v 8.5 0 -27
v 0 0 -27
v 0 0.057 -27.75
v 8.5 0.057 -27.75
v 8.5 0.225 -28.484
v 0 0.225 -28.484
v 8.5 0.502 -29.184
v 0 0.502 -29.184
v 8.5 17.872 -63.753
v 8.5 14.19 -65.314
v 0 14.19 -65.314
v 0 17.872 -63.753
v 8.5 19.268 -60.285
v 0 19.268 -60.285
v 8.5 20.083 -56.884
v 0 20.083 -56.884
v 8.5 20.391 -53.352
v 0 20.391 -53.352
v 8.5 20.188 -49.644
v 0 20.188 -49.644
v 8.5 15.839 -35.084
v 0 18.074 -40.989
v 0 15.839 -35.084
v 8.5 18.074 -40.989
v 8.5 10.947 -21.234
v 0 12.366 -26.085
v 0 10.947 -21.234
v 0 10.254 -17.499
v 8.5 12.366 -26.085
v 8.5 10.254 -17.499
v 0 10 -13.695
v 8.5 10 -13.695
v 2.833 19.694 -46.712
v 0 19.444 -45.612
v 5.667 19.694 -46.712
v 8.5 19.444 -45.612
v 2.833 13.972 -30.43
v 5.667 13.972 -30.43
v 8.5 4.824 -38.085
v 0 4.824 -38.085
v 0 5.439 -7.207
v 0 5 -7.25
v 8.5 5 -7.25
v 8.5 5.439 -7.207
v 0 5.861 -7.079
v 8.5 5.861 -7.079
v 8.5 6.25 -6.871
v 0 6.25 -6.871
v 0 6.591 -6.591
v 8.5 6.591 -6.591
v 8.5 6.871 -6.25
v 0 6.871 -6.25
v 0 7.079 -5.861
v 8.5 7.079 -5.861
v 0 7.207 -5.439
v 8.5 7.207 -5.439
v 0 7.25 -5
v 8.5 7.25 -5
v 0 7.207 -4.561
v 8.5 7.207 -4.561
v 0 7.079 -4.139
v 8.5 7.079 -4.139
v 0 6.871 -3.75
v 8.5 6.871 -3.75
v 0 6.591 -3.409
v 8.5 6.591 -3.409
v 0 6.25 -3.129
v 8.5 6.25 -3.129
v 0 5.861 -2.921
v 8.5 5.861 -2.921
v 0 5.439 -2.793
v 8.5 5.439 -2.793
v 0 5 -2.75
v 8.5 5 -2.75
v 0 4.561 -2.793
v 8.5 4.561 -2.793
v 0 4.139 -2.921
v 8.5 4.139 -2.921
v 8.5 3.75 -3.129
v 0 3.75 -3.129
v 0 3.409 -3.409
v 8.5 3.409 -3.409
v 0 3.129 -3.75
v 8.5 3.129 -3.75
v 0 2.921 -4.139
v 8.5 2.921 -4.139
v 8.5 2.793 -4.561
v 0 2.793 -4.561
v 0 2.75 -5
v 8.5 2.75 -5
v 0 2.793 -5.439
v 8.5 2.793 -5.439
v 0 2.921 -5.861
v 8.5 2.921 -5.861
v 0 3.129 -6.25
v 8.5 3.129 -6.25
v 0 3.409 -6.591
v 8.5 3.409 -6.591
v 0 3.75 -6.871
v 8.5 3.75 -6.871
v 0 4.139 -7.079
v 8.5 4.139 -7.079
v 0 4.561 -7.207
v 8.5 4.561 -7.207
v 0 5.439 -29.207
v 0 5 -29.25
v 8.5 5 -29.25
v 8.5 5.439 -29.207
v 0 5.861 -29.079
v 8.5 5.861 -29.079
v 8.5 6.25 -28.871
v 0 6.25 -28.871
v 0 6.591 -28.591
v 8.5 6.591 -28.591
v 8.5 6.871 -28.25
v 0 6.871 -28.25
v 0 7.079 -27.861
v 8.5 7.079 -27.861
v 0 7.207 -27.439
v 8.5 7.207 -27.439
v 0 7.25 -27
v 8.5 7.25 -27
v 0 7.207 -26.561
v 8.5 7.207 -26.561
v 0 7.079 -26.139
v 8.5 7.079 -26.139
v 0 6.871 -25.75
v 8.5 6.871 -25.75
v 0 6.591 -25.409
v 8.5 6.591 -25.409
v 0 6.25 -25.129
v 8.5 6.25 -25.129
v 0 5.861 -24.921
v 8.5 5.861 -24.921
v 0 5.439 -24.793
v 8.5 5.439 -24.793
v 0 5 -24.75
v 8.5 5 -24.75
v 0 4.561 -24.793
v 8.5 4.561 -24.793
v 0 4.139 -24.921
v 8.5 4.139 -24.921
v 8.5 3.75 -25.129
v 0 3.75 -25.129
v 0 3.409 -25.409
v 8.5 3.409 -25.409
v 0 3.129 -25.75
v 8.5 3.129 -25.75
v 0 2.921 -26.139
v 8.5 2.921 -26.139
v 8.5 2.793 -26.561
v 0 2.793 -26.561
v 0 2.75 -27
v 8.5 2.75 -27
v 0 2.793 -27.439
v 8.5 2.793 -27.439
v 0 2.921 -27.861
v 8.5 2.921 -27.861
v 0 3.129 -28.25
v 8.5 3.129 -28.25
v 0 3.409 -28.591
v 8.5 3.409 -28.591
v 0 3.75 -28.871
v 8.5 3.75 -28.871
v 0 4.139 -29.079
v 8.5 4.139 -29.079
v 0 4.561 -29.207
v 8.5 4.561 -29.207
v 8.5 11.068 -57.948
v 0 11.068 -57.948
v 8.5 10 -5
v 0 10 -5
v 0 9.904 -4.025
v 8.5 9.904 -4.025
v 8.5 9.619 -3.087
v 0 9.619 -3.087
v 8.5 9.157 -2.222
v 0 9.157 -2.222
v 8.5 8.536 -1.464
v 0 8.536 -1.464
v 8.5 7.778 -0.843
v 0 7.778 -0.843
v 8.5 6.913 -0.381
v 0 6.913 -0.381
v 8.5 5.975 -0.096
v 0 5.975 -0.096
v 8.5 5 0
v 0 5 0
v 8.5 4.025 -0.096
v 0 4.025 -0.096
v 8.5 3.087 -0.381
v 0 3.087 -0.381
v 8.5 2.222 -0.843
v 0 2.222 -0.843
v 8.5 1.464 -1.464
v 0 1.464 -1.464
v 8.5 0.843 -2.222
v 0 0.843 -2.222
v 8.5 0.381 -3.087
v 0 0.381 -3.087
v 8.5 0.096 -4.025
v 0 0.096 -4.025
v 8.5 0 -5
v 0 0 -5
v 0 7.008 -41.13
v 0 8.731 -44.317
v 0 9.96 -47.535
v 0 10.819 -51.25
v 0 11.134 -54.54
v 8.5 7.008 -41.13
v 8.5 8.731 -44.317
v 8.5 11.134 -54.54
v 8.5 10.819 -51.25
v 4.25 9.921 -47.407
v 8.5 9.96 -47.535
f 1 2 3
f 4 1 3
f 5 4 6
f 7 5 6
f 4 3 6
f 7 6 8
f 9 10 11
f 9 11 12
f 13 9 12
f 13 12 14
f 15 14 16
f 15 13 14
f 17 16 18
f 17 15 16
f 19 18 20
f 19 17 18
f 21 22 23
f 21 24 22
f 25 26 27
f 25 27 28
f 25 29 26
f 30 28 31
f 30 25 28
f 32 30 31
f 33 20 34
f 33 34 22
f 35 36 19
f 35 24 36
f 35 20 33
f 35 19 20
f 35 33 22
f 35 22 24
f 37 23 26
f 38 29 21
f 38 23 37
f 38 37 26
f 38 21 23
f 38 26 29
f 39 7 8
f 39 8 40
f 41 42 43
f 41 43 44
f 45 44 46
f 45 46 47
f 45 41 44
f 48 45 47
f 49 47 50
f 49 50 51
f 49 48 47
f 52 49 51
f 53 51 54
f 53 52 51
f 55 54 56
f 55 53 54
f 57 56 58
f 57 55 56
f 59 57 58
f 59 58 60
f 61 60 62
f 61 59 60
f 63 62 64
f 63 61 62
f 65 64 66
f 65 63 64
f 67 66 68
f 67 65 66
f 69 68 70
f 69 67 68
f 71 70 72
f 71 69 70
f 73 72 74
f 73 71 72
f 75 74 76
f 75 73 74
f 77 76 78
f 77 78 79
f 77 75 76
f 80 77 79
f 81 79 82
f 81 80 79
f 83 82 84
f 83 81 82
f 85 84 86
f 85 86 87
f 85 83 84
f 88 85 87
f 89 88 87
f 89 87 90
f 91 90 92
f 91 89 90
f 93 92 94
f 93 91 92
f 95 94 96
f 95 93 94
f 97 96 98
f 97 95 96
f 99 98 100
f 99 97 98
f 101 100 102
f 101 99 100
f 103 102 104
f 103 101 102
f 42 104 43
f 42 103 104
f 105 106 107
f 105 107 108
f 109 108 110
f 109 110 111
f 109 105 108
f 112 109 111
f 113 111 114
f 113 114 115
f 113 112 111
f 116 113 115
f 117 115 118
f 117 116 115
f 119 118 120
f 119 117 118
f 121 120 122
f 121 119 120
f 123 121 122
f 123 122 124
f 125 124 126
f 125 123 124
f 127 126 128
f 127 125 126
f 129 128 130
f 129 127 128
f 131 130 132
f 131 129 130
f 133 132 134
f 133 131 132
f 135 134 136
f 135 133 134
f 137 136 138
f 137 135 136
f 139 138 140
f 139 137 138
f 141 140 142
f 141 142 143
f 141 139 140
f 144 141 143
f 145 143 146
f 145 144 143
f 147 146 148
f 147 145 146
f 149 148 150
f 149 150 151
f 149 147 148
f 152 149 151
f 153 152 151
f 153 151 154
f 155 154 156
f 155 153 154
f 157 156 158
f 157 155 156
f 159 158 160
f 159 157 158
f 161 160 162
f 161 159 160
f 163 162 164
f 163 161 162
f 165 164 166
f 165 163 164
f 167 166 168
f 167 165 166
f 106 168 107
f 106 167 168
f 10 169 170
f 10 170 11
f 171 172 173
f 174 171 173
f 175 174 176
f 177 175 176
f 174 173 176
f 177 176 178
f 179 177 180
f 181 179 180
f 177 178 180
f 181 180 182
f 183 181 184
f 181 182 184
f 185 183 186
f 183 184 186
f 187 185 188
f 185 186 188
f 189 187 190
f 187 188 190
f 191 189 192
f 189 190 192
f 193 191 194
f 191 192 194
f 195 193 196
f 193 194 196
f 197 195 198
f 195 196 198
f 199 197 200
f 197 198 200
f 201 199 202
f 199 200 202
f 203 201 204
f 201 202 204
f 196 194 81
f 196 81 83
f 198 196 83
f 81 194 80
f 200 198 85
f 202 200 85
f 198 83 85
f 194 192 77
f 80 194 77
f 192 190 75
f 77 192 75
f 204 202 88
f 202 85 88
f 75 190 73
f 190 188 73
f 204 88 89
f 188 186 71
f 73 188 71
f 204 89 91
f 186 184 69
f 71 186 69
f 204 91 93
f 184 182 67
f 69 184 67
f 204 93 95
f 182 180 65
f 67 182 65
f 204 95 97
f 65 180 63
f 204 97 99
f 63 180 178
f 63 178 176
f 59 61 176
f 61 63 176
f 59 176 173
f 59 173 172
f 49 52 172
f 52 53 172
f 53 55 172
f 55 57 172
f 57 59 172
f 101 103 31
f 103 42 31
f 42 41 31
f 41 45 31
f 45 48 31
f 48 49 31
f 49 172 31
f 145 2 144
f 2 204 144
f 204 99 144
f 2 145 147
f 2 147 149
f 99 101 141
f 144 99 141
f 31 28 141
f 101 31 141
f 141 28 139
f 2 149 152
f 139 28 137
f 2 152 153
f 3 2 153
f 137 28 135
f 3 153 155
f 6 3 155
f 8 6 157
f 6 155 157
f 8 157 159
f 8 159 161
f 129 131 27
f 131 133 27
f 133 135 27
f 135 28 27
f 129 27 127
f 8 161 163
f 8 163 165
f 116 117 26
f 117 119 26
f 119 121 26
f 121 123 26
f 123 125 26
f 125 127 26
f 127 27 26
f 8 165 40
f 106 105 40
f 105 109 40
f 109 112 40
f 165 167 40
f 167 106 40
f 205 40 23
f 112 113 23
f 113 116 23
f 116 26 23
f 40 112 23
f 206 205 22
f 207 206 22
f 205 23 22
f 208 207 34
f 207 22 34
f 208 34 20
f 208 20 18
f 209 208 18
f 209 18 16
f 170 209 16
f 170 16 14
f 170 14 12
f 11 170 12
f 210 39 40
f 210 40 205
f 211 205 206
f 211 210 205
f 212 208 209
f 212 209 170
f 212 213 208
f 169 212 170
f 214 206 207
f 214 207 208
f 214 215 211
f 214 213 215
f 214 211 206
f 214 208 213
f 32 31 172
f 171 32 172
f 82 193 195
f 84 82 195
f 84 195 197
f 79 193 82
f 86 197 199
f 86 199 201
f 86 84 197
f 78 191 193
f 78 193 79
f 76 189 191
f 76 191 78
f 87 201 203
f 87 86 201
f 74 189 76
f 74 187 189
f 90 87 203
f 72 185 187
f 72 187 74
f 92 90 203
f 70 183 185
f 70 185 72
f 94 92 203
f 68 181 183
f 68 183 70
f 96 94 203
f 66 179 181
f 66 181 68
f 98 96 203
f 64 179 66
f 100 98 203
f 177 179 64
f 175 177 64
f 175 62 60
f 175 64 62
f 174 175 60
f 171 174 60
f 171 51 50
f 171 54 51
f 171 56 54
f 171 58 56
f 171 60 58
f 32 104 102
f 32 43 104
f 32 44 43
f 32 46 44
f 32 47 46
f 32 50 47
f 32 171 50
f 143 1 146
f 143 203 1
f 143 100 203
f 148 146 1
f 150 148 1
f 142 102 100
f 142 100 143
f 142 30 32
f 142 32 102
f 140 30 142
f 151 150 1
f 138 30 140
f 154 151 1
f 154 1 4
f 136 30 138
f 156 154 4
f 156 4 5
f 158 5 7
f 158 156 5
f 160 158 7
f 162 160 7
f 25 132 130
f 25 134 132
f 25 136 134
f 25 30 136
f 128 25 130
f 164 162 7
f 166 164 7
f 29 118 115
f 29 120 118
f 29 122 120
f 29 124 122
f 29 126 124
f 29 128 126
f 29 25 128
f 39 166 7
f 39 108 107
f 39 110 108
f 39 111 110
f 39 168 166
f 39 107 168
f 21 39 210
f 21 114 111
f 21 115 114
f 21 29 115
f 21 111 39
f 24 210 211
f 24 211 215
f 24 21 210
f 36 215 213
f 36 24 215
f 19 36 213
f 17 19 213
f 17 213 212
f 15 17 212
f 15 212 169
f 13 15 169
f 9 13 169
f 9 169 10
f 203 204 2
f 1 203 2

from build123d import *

# Parameters (mm, degrees)
SKETCH1_R           = 2.25
BOSS_EXTRUDE1_DEPTH = 8.5
BOSS_EXTRUDE2_DEPTH = 8.5


with BuildPart() as part:
    # Sketch1 → Boss-Extrude1 (new body)
    with BuildSketch(Plane(origin=(0, 0, 0), x_dir=(0, 0, -1), z_dir=(1, 0, 0))):
        with BuildLine():
            Line((27, 10), (5, 10))
            ThreePointArc((5, 10), (0, 5), (5, 0))
            Line((5, 0), (27, 0))
            ThreePointArc((27, 0), (32, 5), (27, 10))
        make_face()
        with Locations((5, 5)):
            Circle(SKETCH1_R, mode=Mode.SUBTRACT)
        with Locations((27, 5)):
            Circle(SKETCH1_R, mode=Mode.SUBTRACT)
    extrude(amount=BOSS_EXTRUDE1_DEPTH)

    # Sketch2 → Boss-Extrude2 (add)
    with BuildSketch(Plane(origin=(8.5, 0, 0), x_dir=(0, 0, -1), z_dir=(1, 0, 0))):
        with BuildLine():
            add(Edge.make_bspline(
                [(63.752972286, 17.872423117), (45.928882678, 26.563787963), (31.059268621, 10), (13.694974759, 10)],
                knots=[0, 0, 0, 0, 1, 1, 1, 1], degree=3))
            Line((13.694974759, 10), (27, 10))
            ThreePointArc((27, 10), (31.87285141, 6.120410255), (29.183837075, 0.502127655))
            Line((29.183837075, 0.502127655), (38.08542066, 4.824084077))
            add(Edge.make_bspline(
                [(38.08542066, 4.824084077), (46.797509509, 11.895222457), (57.948000409, 11.067843667)],
                knots=[0, 0, 0, 1, 1, 1], degree=2))
            Line((57.948000409, 11.067843667), (65.313809691, 14.189518476))
            Line((65.313809691, 14.189518476), (63.752972286, 17.872423117))
        make_face()
    extrude(amount=-BOSS_EXTRUDE2_DEPTH)


solid = part.part
